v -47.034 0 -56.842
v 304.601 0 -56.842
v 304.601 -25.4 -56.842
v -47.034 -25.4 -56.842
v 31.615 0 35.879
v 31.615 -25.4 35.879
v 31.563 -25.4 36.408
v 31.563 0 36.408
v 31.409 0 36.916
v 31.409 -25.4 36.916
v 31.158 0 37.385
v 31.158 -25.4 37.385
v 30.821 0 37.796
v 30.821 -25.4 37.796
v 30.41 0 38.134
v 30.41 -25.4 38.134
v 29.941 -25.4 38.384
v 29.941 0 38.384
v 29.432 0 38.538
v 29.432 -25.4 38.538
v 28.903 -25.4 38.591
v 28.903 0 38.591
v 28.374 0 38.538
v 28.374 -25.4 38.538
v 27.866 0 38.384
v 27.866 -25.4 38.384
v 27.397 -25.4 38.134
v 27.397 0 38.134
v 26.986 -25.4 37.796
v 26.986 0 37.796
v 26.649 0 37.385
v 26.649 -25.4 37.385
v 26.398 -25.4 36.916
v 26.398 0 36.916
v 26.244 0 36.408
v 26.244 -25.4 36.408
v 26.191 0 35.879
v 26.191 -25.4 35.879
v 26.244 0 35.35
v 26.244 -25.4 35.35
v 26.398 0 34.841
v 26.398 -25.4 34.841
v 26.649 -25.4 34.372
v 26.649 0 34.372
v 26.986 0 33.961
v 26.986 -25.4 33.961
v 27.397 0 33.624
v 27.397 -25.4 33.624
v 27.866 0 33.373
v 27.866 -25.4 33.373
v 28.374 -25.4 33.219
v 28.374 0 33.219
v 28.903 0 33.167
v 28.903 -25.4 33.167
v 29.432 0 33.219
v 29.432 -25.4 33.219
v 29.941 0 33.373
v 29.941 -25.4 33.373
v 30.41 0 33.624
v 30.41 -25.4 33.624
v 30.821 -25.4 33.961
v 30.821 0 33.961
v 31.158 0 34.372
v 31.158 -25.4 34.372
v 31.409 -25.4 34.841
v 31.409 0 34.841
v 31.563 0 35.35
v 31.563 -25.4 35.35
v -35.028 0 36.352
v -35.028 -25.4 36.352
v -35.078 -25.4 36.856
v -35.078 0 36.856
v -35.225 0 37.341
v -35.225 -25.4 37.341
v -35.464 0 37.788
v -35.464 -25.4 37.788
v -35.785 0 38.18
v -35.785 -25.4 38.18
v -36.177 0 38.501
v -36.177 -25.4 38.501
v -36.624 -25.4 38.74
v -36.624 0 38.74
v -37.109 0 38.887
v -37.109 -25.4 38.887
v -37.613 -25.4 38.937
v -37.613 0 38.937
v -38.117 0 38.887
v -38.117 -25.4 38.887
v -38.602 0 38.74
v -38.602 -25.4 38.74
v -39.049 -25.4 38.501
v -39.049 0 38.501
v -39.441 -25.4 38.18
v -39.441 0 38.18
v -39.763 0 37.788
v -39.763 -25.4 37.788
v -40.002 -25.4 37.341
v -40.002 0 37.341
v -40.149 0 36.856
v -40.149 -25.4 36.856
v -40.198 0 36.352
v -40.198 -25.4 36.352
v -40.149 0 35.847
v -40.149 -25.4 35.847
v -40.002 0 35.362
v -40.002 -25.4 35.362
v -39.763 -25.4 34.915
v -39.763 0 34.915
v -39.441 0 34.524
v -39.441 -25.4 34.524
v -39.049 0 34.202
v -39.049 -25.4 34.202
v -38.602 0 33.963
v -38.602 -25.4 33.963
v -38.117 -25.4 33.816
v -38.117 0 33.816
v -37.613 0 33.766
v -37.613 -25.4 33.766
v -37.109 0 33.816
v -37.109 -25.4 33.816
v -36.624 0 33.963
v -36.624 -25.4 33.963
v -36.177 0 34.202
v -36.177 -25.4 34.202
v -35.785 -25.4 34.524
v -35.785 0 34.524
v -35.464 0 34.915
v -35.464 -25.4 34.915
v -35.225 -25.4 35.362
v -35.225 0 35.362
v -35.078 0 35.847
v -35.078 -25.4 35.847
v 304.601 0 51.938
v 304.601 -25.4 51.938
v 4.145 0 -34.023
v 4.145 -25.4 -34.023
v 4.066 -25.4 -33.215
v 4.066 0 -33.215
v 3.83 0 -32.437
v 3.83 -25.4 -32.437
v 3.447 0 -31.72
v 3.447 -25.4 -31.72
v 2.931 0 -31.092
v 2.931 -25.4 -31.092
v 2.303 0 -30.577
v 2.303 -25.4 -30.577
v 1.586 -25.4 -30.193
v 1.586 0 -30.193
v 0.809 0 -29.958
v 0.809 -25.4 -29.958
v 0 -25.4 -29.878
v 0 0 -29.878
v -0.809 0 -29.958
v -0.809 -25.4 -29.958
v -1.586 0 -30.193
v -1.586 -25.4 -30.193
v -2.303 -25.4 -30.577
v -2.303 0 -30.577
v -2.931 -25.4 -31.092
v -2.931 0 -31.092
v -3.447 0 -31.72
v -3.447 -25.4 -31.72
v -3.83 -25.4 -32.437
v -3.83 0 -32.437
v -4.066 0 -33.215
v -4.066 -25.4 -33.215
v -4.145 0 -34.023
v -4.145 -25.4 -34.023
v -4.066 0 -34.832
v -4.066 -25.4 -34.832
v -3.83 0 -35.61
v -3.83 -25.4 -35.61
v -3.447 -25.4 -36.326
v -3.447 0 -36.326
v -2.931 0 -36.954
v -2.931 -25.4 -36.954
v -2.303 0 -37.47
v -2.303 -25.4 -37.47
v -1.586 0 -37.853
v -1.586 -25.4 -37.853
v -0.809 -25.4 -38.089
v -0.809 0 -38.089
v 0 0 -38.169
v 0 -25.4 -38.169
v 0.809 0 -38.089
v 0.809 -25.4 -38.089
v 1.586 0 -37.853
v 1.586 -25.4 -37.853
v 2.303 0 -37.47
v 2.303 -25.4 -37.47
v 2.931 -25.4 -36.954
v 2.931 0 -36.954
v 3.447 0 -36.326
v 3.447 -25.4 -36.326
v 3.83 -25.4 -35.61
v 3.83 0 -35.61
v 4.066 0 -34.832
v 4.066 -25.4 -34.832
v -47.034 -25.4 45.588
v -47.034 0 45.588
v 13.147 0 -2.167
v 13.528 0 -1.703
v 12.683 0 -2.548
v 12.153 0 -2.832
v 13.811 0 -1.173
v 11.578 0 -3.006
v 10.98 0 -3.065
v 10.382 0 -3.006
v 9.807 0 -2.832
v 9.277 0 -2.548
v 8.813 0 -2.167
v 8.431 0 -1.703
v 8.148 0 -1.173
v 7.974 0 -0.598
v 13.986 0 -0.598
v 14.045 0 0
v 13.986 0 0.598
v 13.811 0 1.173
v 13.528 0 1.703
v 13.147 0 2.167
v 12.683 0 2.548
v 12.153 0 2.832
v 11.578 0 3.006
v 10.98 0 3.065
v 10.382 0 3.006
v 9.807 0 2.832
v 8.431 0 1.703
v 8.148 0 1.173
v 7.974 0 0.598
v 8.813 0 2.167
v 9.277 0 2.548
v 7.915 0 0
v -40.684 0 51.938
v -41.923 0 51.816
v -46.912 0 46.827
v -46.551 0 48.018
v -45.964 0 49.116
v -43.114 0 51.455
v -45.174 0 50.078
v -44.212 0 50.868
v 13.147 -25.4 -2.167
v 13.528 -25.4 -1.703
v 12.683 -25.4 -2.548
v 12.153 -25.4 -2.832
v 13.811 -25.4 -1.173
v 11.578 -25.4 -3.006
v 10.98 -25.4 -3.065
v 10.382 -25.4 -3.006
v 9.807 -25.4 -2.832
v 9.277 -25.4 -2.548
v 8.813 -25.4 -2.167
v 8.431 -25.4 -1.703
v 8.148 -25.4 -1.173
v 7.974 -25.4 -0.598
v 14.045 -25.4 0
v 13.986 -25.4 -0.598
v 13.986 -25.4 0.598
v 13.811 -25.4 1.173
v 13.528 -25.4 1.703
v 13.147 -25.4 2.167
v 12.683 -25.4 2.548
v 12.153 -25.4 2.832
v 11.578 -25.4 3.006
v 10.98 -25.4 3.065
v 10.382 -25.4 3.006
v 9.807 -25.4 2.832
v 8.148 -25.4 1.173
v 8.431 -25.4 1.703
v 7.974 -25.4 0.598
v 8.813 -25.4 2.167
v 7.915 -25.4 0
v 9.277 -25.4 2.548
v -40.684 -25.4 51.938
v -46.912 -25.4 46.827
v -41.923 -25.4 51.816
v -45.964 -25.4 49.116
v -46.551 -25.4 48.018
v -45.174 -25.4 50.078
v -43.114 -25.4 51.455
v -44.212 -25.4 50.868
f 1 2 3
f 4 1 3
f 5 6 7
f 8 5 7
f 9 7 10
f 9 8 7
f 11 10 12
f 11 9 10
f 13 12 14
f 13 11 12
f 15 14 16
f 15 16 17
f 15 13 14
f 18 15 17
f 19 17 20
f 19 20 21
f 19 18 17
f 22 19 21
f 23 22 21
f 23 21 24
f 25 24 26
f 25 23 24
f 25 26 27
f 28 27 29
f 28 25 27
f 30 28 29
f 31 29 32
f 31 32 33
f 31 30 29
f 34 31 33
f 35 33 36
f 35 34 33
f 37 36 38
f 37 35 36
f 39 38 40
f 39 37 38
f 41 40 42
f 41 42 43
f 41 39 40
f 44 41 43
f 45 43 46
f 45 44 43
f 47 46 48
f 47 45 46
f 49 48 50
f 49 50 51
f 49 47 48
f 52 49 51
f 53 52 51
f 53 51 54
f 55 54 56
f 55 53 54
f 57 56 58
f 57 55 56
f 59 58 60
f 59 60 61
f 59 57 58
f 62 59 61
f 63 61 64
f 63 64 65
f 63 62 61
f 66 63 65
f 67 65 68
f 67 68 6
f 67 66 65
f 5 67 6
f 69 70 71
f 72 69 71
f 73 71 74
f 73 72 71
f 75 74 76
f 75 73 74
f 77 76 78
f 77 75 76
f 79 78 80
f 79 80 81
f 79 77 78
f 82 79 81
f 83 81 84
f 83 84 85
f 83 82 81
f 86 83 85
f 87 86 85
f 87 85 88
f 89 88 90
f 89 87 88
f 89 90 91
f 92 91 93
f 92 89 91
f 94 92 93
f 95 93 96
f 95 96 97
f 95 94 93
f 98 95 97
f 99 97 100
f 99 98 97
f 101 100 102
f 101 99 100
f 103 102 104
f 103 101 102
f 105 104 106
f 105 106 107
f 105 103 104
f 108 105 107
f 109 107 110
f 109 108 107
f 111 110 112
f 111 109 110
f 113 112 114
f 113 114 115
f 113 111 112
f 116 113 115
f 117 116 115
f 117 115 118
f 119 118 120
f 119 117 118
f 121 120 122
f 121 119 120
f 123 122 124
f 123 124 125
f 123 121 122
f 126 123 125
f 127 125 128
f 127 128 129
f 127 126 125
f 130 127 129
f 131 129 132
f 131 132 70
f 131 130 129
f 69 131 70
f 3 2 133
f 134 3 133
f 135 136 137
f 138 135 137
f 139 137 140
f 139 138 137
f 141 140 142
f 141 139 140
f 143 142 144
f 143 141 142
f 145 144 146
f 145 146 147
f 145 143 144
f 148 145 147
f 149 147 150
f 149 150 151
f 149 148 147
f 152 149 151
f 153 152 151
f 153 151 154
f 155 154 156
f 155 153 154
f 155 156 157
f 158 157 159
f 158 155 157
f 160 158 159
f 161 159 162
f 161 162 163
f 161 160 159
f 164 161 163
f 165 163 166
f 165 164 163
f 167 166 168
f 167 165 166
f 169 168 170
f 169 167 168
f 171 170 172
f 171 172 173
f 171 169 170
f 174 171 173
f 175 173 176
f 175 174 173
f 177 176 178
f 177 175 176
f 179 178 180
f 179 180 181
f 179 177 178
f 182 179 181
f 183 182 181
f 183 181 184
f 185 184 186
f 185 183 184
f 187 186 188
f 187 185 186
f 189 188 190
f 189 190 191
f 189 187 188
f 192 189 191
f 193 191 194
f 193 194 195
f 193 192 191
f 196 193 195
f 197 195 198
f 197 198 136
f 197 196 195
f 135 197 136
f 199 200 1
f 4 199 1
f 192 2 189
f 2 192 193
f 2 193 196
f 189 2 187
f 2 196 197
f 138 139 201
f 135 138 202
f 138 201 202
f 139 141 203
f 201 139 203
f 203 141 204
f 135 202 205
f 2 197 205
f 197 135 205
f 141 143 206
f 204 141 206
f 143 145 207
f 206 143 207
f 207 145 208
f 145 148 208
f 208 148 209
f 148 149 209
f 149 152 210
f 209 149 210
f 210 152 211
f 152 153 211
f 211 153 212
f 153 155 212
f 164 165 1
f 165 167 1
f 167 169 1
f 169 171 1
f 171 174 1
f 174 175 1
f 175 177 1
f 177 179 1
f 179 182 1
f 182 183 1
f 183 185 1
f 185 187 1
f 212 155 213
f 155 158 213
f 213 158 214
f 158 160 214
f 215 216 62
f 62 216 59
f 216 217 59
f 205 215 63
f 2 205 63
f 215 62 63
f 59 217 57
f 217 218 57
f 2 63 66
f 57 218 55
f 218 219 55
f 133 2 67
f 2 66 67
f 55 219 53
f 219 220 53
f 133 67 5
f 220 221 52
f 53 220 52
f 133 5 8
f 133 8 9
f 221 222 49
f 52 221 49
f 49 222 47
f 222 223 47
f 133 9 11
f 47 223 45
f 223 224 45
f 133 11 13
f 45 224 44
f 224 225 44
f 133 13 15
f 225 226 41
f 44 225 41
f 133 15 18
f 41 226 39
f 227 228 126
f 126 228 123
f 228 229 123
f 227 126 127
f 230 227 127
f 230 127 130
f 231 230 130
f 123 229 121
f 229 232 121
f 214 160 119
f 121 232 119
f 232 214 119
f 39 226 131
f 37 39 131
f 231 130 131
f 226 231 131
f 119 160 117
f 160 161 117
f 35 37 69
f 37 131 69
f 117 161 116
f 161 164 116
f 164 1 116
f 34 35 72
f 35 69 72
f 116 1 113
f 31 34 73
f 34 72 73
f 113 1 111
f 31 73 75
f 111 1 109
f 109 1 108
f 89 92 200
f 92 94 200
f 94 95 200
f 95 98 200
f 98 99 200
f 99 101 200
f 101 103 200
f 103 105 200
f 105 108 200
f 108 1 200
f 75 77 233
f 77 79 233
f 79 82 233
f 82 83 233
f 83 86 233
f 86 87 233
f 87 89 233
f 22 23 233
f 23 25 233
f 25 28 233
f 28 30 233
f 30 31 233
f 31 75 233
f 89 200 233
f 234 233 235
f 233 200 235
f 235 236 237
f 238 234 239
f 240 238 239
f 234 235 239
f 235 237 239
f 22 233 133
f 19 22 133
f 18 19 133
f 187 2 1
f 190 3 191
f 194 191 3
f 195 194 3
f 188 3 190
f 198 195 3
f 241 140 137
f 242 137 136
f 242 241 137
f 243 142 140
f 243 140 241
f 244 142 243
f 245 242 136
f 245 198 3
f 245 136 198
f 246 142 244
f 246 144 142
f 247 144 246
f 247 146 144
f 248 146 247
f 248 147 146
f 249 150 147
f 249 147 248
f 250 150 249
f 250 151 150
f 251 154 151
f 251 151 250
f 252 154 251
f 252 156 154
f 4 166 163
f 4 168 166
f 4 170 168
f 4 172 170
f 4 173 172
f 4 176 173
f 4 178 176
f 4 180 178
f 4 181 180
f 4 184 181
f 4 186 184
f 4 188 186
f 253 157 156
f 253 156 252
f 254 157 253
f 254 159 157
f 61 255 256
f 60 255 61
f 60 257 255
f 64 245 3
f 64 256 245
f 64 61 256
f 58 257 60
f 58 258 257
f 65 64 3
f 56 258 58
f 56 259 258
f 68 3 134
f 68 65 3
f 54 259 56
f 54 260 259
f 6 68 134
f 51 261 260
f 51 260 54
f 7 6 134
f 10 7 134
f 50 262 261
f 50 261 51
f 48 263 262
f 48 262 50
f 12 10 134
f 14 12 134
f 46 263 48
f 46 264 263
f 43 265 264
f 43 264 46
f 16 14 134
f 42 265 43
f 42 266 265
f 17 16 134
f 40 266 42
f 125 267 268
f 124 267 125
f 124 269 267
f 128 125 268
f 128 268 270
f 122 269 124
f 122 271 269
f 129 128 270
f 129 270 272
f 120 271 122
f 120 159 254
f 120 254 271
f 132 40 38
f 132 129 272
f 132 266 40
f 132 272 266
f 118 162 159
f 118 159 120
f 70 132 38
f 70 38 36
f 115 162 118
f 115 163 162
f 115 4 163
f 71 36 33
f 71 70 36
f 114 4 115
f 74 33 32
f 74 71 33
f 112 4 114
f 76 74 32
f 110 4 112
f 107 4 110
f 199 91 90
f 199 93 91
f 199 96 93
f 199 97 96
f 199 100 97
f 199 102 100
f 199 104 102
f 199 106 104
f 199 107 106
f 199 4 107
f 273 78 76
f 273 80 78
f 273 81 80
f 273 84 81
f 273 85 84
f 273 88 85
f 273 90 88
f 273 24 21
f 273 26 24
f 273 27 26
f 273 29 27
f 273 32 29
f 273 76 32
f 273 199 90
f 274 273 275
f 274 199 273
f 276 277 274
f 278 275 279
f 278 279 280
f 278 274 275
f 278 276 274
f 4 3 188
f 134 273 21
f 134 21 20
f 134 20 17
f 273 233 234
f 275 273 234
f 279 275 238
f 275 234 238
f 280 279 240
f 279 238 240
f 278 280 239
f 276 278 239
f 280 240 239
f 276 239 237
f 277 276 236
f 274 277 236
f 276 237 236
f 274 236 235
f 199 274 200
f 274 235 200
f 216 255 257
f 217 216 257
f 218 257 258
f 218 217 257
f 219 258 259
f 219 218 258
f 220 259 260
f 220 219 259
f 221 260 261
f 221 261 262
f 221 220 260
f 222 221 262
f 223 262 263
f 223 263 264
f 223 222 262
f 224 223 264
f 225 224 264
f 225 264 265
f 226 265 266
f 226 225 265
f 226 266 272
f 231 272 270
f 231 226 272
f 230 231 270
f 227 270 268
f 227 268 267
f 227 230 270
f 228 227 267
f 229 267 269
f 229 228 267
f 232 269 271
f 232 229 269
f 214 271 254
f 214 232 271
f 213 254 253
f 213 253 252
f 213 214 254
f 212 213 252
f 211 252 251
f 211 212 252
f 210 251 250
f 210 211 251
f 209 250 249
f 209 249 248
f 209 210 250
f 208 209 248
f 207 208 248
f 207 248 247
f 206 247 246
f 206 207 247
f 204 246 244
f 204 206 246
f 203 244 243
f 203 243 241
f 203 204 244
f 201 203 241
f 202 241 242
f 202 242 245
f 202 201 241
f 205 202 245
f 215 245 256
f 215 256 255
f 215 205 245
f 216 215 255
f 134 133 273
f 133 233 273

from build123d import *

# Parameters (mm, degrees)
F0_R     = 4.145299883
F0_R_2   = 2.5851912666
F0_R_3   = 3.0648919033
F0_R_4   = 2.7118286766
F1_DEPTH = 25.4
F2_DEPTH = 254


# Not quite as in the source:
# - the program builds the solid bodies; features that only make, move or delete a surface that nothing else refers to are left out


with BuildPart() as f1:
    # F0 (on Front) → F1 (new body)
    with BuildSketch(Plane.XZ):
        with BuildLine():
            Line((50.6008081138, 51.9382767379), (-40.6842338085, 51.9382767379))
            ThreePointArc((-40.6842338085, 51.9382767379), (-45.1743618691, 50.0784047985), (-47.0342338085, 45.5882767379))
            Line((-47.0342338085, 45.5882767379), (-47.0342338085, -56.842315942))
            Line((-47.0342338085, -56.842315942), (50.6008081138, -56.842315942))
            Line((50.6008081138, -56.842315942), (50.6008081138, 51.9382767379))
        make_face()
        with Locations((0, -34.0232253075)):
            Circle(F0_R, mode=Mode.SUBTRACT)
        with Locations((-37.6131273806, 36.3515801728)):
            Circle(F0_R_2, mode=Mode.SUBTRACT)
        with Locations((10.9797539189, 0)):
            Circle(F0_R_3, mode=Mode.SUBTRACT)
        with Locations((28.9033185691, 35.878714174)):
            Circle(F0_R_4, mode=Mode.SUBTRACT)
    extrude(amount=F1_DEPTH)

    # F2 (add): a face of the model
    f2_faces = [f1.faces().sort_by_distance(p)[0] for p in [
        (50.6008081138, -12.7, -2.4520196021),
    ]]
    extrude(f2_faces, amount=F2_DEPTH)


solid = f1.part
